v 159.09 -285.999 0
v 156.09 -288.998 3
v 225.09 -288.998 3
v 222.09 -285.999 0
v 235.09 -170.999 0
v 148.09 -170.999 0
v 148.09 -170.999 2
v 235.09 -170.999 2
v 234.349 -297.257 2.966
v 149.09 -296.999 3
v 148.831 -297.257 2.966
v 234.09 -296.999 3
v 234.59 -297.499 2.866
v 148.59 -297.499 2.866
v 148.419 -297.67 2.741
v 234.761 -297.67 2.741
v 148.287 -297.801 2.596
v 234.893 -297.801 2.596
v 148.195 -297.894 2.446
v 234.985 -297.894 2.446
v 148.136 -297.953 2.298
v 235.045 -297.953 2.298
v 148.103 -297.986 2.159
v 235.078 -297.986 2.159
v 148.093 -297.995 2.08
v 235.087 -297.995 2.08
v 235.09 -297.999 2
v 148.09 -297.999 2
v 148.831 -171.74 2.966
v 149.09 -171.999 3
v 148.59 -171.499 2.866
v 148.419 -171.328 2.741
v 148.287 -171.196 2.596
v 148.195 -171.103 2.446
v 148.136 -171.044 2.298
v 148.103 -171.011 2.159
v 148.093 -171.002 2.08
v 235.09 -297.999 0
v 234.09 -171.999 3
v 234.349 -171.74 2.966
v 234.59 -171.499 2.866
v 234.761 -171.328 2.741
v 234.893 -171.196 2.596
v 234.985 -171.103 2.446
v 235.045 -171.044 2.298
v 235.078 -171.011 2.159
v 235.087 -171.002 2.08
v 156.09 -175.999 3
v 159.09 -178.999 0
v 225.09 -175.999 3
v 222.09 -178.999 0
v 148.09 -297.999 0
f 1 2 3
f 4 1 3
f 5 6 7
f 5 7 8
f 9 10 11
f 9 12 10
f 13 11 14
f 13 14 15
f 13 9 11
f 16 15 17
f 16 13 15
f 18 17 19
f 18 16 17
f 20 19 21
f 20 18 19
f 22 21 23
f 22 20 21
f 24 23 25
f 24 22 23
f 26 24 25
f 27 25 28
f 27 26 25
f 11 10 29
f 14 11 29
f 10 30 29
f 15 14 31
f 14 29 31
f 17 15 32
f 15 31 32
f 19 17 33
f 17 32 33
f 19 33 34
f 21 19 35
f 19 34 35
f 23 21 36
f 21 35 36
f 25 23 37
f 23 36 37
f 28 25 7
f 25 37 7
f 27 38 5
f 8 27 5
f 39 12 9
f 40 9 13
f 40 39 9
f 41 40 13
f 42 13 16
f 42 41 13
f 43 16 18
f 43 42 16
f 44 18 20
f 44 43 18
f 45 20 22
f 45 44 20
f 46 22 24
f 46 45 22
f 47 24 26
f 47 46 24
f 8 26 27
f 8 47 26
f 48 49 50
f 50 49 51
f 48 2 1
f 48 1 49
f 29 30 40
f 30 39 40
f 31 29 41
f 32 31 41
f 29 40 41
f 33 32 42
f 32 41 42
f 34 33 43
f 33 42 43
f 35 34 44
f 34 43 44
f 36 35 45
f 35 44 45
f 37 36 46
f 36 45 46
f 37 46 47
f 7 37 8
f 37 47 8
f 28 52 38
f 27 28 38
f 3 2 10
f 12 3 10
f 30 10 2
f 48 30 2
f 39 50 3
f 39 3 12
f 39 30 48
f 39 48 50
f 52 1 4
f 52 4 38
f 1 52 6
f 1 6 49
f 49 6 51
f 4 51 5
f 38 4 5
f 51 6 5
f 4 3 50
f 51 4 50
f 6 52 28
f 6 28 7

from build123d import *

# Parameters (mm, degrees)
SKETCH1_W           = 87
SKETCH1_H           = 127
SKETCH1_W_2         = 79
SKETCH1_H_2         = 119
SKETCH1_W_3         = 63
SKETCH1_H_3         = 107
BOSS_EXTRUDE1_DEPTH = 3
CHAMFER2_SIZE       = 3
FILLET1_R           = 1


with BuildPart() as part:
    # Sketch1 → Boss-Extrude1 (new body)
    # profile 1 of 2: a face of its own
    with BuildSketch(Plane.XY):
        with Locations((191.590301411, -234.498578163)):
            Rectangle(SKETCH1_W, SKETCH1_H)
        with Locations((191.590301411, -234.498578163)):
            Rectangle(SKETCH1_W_2, SKETCH1_H_2, mode=Mode.SUBTRACT)
    # profile 2 of 2: a face of its own
    with BuildSketch(Plane.XY):
        with Locations((191.590301411, -234.498578163)):
            Rectangle(SKETCH1_W_2, SKETCH1_H_2)
        with Locations((190.590301411, -232.498578163)):
            Rectangle(SKETCH1_W_3, SKETCH1_H_3, mode=Mode.SUBTRACT)
    extrude(amount=BOSS_EXTRUDE1_DEPTH)

    # Chamfer2
    chamfer2_edges = [part.edges().sort_by_distance(p)[0] for p in [
        (190.590301411, -285.998578163, 3),
        (159.090301411, -232.498578163, 3),
        (190.590301411, -178.998578163, 3),
        (222.090301411, -232.498578163, 3),
    ]]
    chamfer(chamfer2_edges, length=CHAMFER2_SIZE - 0.0001)  # a hair under: the kernel refuses the full size

    # Fillet1
    fillet1_edges = [part.edges().sort_by_distance(p)[0] for p in [
        (191.590301411, -170.998578163, 3),
        (148.090301411, -234.498578163, 3),
        (191.590301411, -297.998578163, 3),
        (235.090301411, -234.498578163, 3),
    ]]
    fillet(fillet1_edges, radius=FILLET1_R)


solid = part.part
